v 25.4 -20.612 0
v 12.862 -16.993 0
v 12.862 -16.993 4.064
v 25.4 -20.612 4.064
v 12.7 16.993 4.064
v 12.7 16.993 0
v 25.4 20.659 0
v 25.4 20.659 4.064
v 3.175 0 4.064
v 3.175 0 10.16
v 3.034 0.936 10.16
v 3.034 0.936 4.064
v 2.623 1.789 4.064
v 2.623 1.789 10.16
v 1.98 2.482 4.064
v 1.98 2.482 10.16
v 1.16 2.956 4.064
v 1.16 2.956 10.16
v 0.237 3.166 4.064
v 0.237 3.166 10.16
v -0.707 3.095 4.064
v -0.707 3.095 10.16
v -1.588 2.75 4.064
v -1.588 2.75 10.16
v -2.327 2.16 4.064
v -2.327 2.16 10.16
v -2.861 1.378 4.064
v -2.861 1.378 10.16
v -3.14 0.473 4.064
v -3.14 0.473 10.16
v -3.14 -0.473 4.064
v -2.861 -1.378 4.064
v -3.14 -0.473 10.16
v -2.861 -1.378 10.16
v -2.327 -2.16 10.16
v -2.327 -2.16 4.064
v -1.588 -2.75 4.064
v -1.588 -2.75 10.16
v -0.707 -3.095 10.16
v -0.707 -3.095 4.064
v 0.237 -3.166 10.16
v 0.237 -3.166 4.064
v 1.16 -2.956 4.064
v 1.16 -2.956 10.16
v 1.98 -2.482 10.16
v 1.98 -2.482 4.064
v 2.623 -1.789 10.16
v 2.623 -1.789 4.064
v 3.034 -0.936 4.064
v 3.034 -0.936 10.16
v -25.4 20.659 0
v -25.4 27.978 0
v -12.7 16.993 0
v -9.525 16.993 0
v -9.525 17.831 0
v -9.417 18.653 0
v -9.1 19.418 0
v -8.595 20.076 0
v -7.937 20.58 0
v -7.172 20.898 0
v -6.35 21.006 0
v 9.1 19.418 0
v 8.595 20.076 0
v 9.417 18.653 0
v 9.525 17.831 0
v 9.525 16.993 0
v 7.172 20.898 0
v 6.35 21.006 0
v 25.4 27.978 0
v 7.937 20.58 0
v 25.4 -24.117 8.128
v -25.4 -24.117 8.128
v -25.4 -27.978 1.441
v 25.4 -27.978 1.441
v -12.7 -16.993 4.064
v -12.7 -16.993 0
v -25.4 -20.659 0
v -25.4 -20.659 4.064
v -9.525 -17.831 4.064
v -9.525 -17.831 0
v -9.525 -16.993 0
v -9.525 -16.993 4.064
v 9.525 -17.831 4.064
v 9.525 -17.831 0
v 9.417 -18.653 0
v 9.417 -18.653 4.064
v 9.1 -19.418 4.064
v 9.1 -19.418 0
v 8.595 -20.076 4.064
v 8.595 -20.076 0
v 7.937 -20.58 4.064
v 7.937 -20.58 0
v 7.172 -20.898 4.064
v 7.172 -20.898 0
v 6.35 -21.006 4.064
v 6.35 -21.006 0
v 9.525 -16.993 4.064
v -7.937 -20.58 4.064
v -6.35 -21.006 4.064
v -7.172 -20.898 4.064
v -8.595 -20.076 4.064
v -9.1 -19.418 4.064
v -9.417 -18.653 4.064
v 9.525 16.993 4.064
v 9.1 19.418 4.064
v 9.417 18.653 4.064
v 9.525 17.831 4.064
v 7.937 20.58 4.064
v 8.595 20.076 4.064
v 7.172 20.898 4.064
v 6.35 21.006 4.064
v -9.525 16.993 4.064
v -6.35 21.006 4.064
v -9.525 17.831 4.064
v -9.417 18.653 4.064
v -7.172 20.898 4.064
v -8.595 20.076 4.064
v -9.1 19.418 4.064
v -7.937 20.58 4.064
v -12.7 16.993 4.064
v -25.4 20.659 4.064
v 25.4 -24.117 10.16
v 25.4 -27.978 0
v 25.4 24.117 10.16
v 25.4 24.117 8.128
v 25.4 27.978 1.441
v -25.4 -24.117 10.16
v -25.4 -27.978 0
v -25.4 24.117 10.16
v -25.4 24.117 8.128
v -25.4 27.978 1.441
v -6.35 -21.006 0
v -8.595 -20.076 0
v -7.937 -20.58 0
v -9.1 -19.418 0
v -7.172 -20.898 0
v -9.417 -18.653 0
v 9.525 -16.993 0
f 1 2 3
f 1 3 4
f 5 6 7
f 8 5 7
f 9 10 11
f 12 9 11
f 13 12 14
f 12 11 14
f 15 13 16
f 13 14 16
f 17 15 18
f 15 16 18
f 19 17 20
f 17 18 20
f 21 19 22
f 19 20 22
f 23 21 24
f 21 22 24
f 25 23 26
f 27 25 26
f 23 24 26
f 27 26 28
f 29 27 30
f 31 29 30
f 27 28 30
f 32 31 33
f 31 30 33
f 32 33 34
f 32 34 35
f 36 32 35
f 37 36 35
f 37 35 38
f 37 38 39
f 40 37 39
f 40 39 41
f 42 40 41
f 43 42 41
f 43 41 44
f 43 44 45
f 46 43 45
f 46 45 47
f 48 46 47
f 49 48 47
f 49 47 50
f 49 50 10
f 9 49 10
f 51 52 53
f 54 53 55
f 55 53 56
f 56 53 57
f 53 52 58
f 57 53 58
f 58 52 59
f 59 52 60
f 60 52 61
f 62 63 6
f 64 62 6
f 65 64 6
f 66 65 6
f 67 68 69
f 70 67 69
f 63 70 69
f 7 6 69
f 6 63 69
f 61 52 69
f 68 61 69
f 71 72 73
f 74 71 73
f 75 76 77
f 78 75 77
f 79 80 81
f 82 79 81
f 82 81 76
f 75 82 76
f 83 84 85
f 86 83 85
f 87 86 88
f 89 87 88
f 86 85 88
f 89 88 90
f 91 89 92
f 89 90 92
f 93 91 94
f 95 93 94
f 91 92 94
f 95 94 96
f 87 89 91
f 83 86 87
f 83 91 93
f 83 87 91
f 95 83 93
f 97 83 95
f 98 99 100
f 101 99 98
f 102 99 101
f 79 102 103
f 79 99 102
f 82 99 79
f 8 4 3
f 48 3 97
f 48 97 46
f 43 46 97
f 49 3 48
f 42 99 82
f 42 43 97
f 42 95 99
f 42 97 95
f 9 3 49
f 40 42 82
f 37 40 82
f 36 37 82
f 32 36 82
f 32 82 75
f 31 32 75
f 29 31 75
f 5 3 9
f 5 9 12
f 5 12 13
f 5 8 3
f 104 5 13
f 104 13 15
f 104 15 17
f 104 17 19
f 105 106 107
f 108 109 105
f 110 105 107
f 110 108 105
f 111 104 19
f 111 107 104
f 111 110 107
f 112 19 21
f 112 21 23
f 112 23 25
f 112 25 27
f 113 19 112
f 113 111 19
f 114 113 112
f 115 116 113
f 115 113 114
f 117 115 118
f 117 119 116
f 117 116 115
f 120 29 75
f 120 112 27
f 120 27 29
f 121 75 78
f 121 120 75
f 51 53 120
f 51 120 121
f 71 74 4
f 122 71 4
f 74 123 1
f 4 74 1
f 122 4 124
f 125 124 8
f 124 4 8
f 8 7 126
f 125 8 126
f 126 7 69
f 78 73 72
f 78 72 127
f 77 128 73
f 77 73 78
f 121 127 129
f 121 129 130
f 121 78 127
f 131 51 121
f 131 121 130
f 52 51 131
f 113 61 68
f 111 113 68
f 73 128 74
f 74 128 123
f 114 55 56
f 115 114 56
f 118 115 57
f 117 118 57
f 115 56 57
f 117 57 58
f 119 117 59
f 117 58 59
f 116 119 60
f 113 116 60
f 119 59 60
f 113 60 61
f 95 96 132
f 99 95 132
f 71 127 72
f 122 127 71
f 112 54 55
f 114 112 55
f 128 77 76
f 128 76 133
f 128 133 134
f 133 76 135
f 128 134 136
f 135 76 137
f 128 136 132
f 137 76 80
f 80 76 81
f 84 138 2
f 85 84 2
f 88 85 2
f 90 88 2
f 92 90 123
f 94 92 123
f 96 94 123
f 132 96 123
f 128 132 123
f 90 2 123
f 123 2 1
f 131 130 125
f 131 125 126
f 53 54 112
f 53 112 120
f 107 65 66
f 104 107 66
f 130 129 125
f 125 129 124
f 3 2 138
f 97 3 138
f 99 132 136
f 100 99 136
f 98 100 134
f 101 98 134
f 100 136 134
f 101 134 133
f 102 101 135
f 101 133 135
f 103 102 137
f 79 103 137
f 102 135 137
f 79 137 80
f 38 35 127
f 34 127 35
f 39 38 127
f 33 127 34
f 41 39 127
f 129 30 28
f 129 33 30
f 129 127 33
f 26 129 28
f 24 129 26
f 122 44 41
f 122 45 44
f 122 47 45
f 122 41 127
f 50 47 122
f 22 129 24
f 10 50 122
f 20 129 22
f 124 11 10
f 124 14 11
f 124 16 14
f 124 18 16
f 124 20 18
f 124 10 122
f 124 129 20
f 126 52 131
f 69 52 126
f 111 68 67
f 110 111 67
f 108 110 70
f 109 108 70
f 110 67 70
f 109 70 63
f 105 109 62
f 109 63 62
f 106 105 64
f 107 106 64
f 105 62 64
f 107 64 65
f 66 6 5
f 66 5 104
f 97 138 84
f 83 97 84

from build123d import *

# Parameters (mm, degrees)
SKETCH1_W           = 50.8
SKETCH1_H           = 55.9562
BOSS_EXTRUDE1_DEPTH = 10.16
SKETCH2_W           = 50.8
SKETCH2_H           = 3.8608
CUT_EXTRUDE1_DEPTH  = 2.032
CUT_EXTRUDE2_DEPTH  = 51.8
SKETCH4_R           = 3.175
CUT_EXTRUDE3_DEPTH  = 11.16
SKETCH5_W           = 50.8
SKETCH5_H           = 33.9852
CUT_EXTRUDE4_DEPTH  = 4.064
CUT_EXTRUDE5_DEPTH  = 4.064
CUT_EXTRUDE6_DEPTH  = 4.064


with BuildPart() as part:
    # Sketch1 → Boss-Extrude1 (new body)
    with BuildSketch(Plane.XY):
        Rectangle(SKETCH1_W, SKETCH1_H)
    extrude(amount=BOSS_EXTRUDE1_DEPTH)

    # Sketch2 → Cut-Extrude1 (cut)
    with BuildSketch(Plane.XY.offset(10.16)):
        with Locations((0, 26.0477)):
            Rectangle(SKETCH2_W, SKETCH2_H)
        with Locations((0, -26.0477)):
            Rectangle(SKETCH2_W, SKETCH2_H)
    extrude(amount=-CUT_EXTRUDE1_DEPTH, mode=Mode.SUBTRACT)

    # Sketch3 → Cut-Extrude2 (cut, through all)
    with BuildSketch(Plane.ZY.offset(25.4)):
        Polygon((8.128, 24.1173), (1.440898242, 27.9781), (8.128, 27.9781), align=None)
        Polygon((8.128, -24.1173), (1.440898242, -27.9781), (8.128, -27.9781), align=None)
    extrude(amount=-CUT_EXTRUDE2_DEPTH, mode=Mode.SUBTRACT)

    # Sketch4 → Cut-Extrude3 (cut, through all)
    with BuildSketch(Plane.XY.offset(10.16)):
        Circle(SKETCH4_R)
    extrude(amount=-CUT_EXTRUDE3_DEPTH, mode=Mode.SUBTRACT)

    # Sketch5 → Cut-Extrude4 (cut)
    with BuildSketch(Plane(origin=(0, 0, 0), x_dir=(-1, 0, 0), z_dir=(0, 0, -1))):
        Rectangle(SKETCH5_W, SKETCH5_H)
    extrude(amount=-CUT_EXTRUDE4_DEPTH, mode=Mode.SUBTRACT)

    # Sketch6 → Cut-Extrude5 (cut)
    with BuildSketch(Plane(origin=(0, 0, 0), x_dir=(-1, 0, 0), z_dir=(0, 0, -1))):
        with BuildLine():
            Line((6.35, 21.0058), (-6.35, 21.0058))
            ThreePointArc((-6.35, 21.0058), (-8.59506403, 20.07586403), (-9.525, 17.8308))
            Line((-9.525, 17.8308), (-9.525, -17.8308))
            ThreePointArc((-9.525, -17.8308), (-8.59506403, -20.07586403), (-6.35, -21.0058))
            Line((-6.35, -21.0058), (6.35, -21.0058))
            ThreePointArc((6.35, -21.0058), (8.59506403, -20.07586403), (9.525, -17.8308))
            Line((9.525, -17.8308), (9.525, 17.8308))
            ThreePointArc((9.525, 17.8308), (8.59506403, 20.07586403), (6.35, 21.0058))
        make_face()
    extrude(amount=-CUT_EXTRUDE5_DEPTH, mode=Mode.SUBTRACT)

    # Sketch7 → Cut-Extrude6 (cut)
    with BuildSketch(Plane(origin=(0, 0, 0), x_dir=(-1, 0, 0), z_dir=(0, 0, -1))):
        Polygon((-12.7, 16.9926), (-25.4, 20.658774209), (-25.4, 16.9926), align=None)
        Polygon((-12.861684204, -16.9926), (-25.4, -20.6121), (-25.4, -16.9926), align=None)
        Polygon((12.7, -16.9926), (25.4, -20.658774209), (25.4, -16.9926), align=None)
        Polygon((12.7, 16.9926), (25.4, 20.658774209), (25.4, 16.9926), align=None)
    extrude(amount=-CUT_EXTRUDE6_DEPTH, mode=Mode.SUBTRACT)


solid = part.part
